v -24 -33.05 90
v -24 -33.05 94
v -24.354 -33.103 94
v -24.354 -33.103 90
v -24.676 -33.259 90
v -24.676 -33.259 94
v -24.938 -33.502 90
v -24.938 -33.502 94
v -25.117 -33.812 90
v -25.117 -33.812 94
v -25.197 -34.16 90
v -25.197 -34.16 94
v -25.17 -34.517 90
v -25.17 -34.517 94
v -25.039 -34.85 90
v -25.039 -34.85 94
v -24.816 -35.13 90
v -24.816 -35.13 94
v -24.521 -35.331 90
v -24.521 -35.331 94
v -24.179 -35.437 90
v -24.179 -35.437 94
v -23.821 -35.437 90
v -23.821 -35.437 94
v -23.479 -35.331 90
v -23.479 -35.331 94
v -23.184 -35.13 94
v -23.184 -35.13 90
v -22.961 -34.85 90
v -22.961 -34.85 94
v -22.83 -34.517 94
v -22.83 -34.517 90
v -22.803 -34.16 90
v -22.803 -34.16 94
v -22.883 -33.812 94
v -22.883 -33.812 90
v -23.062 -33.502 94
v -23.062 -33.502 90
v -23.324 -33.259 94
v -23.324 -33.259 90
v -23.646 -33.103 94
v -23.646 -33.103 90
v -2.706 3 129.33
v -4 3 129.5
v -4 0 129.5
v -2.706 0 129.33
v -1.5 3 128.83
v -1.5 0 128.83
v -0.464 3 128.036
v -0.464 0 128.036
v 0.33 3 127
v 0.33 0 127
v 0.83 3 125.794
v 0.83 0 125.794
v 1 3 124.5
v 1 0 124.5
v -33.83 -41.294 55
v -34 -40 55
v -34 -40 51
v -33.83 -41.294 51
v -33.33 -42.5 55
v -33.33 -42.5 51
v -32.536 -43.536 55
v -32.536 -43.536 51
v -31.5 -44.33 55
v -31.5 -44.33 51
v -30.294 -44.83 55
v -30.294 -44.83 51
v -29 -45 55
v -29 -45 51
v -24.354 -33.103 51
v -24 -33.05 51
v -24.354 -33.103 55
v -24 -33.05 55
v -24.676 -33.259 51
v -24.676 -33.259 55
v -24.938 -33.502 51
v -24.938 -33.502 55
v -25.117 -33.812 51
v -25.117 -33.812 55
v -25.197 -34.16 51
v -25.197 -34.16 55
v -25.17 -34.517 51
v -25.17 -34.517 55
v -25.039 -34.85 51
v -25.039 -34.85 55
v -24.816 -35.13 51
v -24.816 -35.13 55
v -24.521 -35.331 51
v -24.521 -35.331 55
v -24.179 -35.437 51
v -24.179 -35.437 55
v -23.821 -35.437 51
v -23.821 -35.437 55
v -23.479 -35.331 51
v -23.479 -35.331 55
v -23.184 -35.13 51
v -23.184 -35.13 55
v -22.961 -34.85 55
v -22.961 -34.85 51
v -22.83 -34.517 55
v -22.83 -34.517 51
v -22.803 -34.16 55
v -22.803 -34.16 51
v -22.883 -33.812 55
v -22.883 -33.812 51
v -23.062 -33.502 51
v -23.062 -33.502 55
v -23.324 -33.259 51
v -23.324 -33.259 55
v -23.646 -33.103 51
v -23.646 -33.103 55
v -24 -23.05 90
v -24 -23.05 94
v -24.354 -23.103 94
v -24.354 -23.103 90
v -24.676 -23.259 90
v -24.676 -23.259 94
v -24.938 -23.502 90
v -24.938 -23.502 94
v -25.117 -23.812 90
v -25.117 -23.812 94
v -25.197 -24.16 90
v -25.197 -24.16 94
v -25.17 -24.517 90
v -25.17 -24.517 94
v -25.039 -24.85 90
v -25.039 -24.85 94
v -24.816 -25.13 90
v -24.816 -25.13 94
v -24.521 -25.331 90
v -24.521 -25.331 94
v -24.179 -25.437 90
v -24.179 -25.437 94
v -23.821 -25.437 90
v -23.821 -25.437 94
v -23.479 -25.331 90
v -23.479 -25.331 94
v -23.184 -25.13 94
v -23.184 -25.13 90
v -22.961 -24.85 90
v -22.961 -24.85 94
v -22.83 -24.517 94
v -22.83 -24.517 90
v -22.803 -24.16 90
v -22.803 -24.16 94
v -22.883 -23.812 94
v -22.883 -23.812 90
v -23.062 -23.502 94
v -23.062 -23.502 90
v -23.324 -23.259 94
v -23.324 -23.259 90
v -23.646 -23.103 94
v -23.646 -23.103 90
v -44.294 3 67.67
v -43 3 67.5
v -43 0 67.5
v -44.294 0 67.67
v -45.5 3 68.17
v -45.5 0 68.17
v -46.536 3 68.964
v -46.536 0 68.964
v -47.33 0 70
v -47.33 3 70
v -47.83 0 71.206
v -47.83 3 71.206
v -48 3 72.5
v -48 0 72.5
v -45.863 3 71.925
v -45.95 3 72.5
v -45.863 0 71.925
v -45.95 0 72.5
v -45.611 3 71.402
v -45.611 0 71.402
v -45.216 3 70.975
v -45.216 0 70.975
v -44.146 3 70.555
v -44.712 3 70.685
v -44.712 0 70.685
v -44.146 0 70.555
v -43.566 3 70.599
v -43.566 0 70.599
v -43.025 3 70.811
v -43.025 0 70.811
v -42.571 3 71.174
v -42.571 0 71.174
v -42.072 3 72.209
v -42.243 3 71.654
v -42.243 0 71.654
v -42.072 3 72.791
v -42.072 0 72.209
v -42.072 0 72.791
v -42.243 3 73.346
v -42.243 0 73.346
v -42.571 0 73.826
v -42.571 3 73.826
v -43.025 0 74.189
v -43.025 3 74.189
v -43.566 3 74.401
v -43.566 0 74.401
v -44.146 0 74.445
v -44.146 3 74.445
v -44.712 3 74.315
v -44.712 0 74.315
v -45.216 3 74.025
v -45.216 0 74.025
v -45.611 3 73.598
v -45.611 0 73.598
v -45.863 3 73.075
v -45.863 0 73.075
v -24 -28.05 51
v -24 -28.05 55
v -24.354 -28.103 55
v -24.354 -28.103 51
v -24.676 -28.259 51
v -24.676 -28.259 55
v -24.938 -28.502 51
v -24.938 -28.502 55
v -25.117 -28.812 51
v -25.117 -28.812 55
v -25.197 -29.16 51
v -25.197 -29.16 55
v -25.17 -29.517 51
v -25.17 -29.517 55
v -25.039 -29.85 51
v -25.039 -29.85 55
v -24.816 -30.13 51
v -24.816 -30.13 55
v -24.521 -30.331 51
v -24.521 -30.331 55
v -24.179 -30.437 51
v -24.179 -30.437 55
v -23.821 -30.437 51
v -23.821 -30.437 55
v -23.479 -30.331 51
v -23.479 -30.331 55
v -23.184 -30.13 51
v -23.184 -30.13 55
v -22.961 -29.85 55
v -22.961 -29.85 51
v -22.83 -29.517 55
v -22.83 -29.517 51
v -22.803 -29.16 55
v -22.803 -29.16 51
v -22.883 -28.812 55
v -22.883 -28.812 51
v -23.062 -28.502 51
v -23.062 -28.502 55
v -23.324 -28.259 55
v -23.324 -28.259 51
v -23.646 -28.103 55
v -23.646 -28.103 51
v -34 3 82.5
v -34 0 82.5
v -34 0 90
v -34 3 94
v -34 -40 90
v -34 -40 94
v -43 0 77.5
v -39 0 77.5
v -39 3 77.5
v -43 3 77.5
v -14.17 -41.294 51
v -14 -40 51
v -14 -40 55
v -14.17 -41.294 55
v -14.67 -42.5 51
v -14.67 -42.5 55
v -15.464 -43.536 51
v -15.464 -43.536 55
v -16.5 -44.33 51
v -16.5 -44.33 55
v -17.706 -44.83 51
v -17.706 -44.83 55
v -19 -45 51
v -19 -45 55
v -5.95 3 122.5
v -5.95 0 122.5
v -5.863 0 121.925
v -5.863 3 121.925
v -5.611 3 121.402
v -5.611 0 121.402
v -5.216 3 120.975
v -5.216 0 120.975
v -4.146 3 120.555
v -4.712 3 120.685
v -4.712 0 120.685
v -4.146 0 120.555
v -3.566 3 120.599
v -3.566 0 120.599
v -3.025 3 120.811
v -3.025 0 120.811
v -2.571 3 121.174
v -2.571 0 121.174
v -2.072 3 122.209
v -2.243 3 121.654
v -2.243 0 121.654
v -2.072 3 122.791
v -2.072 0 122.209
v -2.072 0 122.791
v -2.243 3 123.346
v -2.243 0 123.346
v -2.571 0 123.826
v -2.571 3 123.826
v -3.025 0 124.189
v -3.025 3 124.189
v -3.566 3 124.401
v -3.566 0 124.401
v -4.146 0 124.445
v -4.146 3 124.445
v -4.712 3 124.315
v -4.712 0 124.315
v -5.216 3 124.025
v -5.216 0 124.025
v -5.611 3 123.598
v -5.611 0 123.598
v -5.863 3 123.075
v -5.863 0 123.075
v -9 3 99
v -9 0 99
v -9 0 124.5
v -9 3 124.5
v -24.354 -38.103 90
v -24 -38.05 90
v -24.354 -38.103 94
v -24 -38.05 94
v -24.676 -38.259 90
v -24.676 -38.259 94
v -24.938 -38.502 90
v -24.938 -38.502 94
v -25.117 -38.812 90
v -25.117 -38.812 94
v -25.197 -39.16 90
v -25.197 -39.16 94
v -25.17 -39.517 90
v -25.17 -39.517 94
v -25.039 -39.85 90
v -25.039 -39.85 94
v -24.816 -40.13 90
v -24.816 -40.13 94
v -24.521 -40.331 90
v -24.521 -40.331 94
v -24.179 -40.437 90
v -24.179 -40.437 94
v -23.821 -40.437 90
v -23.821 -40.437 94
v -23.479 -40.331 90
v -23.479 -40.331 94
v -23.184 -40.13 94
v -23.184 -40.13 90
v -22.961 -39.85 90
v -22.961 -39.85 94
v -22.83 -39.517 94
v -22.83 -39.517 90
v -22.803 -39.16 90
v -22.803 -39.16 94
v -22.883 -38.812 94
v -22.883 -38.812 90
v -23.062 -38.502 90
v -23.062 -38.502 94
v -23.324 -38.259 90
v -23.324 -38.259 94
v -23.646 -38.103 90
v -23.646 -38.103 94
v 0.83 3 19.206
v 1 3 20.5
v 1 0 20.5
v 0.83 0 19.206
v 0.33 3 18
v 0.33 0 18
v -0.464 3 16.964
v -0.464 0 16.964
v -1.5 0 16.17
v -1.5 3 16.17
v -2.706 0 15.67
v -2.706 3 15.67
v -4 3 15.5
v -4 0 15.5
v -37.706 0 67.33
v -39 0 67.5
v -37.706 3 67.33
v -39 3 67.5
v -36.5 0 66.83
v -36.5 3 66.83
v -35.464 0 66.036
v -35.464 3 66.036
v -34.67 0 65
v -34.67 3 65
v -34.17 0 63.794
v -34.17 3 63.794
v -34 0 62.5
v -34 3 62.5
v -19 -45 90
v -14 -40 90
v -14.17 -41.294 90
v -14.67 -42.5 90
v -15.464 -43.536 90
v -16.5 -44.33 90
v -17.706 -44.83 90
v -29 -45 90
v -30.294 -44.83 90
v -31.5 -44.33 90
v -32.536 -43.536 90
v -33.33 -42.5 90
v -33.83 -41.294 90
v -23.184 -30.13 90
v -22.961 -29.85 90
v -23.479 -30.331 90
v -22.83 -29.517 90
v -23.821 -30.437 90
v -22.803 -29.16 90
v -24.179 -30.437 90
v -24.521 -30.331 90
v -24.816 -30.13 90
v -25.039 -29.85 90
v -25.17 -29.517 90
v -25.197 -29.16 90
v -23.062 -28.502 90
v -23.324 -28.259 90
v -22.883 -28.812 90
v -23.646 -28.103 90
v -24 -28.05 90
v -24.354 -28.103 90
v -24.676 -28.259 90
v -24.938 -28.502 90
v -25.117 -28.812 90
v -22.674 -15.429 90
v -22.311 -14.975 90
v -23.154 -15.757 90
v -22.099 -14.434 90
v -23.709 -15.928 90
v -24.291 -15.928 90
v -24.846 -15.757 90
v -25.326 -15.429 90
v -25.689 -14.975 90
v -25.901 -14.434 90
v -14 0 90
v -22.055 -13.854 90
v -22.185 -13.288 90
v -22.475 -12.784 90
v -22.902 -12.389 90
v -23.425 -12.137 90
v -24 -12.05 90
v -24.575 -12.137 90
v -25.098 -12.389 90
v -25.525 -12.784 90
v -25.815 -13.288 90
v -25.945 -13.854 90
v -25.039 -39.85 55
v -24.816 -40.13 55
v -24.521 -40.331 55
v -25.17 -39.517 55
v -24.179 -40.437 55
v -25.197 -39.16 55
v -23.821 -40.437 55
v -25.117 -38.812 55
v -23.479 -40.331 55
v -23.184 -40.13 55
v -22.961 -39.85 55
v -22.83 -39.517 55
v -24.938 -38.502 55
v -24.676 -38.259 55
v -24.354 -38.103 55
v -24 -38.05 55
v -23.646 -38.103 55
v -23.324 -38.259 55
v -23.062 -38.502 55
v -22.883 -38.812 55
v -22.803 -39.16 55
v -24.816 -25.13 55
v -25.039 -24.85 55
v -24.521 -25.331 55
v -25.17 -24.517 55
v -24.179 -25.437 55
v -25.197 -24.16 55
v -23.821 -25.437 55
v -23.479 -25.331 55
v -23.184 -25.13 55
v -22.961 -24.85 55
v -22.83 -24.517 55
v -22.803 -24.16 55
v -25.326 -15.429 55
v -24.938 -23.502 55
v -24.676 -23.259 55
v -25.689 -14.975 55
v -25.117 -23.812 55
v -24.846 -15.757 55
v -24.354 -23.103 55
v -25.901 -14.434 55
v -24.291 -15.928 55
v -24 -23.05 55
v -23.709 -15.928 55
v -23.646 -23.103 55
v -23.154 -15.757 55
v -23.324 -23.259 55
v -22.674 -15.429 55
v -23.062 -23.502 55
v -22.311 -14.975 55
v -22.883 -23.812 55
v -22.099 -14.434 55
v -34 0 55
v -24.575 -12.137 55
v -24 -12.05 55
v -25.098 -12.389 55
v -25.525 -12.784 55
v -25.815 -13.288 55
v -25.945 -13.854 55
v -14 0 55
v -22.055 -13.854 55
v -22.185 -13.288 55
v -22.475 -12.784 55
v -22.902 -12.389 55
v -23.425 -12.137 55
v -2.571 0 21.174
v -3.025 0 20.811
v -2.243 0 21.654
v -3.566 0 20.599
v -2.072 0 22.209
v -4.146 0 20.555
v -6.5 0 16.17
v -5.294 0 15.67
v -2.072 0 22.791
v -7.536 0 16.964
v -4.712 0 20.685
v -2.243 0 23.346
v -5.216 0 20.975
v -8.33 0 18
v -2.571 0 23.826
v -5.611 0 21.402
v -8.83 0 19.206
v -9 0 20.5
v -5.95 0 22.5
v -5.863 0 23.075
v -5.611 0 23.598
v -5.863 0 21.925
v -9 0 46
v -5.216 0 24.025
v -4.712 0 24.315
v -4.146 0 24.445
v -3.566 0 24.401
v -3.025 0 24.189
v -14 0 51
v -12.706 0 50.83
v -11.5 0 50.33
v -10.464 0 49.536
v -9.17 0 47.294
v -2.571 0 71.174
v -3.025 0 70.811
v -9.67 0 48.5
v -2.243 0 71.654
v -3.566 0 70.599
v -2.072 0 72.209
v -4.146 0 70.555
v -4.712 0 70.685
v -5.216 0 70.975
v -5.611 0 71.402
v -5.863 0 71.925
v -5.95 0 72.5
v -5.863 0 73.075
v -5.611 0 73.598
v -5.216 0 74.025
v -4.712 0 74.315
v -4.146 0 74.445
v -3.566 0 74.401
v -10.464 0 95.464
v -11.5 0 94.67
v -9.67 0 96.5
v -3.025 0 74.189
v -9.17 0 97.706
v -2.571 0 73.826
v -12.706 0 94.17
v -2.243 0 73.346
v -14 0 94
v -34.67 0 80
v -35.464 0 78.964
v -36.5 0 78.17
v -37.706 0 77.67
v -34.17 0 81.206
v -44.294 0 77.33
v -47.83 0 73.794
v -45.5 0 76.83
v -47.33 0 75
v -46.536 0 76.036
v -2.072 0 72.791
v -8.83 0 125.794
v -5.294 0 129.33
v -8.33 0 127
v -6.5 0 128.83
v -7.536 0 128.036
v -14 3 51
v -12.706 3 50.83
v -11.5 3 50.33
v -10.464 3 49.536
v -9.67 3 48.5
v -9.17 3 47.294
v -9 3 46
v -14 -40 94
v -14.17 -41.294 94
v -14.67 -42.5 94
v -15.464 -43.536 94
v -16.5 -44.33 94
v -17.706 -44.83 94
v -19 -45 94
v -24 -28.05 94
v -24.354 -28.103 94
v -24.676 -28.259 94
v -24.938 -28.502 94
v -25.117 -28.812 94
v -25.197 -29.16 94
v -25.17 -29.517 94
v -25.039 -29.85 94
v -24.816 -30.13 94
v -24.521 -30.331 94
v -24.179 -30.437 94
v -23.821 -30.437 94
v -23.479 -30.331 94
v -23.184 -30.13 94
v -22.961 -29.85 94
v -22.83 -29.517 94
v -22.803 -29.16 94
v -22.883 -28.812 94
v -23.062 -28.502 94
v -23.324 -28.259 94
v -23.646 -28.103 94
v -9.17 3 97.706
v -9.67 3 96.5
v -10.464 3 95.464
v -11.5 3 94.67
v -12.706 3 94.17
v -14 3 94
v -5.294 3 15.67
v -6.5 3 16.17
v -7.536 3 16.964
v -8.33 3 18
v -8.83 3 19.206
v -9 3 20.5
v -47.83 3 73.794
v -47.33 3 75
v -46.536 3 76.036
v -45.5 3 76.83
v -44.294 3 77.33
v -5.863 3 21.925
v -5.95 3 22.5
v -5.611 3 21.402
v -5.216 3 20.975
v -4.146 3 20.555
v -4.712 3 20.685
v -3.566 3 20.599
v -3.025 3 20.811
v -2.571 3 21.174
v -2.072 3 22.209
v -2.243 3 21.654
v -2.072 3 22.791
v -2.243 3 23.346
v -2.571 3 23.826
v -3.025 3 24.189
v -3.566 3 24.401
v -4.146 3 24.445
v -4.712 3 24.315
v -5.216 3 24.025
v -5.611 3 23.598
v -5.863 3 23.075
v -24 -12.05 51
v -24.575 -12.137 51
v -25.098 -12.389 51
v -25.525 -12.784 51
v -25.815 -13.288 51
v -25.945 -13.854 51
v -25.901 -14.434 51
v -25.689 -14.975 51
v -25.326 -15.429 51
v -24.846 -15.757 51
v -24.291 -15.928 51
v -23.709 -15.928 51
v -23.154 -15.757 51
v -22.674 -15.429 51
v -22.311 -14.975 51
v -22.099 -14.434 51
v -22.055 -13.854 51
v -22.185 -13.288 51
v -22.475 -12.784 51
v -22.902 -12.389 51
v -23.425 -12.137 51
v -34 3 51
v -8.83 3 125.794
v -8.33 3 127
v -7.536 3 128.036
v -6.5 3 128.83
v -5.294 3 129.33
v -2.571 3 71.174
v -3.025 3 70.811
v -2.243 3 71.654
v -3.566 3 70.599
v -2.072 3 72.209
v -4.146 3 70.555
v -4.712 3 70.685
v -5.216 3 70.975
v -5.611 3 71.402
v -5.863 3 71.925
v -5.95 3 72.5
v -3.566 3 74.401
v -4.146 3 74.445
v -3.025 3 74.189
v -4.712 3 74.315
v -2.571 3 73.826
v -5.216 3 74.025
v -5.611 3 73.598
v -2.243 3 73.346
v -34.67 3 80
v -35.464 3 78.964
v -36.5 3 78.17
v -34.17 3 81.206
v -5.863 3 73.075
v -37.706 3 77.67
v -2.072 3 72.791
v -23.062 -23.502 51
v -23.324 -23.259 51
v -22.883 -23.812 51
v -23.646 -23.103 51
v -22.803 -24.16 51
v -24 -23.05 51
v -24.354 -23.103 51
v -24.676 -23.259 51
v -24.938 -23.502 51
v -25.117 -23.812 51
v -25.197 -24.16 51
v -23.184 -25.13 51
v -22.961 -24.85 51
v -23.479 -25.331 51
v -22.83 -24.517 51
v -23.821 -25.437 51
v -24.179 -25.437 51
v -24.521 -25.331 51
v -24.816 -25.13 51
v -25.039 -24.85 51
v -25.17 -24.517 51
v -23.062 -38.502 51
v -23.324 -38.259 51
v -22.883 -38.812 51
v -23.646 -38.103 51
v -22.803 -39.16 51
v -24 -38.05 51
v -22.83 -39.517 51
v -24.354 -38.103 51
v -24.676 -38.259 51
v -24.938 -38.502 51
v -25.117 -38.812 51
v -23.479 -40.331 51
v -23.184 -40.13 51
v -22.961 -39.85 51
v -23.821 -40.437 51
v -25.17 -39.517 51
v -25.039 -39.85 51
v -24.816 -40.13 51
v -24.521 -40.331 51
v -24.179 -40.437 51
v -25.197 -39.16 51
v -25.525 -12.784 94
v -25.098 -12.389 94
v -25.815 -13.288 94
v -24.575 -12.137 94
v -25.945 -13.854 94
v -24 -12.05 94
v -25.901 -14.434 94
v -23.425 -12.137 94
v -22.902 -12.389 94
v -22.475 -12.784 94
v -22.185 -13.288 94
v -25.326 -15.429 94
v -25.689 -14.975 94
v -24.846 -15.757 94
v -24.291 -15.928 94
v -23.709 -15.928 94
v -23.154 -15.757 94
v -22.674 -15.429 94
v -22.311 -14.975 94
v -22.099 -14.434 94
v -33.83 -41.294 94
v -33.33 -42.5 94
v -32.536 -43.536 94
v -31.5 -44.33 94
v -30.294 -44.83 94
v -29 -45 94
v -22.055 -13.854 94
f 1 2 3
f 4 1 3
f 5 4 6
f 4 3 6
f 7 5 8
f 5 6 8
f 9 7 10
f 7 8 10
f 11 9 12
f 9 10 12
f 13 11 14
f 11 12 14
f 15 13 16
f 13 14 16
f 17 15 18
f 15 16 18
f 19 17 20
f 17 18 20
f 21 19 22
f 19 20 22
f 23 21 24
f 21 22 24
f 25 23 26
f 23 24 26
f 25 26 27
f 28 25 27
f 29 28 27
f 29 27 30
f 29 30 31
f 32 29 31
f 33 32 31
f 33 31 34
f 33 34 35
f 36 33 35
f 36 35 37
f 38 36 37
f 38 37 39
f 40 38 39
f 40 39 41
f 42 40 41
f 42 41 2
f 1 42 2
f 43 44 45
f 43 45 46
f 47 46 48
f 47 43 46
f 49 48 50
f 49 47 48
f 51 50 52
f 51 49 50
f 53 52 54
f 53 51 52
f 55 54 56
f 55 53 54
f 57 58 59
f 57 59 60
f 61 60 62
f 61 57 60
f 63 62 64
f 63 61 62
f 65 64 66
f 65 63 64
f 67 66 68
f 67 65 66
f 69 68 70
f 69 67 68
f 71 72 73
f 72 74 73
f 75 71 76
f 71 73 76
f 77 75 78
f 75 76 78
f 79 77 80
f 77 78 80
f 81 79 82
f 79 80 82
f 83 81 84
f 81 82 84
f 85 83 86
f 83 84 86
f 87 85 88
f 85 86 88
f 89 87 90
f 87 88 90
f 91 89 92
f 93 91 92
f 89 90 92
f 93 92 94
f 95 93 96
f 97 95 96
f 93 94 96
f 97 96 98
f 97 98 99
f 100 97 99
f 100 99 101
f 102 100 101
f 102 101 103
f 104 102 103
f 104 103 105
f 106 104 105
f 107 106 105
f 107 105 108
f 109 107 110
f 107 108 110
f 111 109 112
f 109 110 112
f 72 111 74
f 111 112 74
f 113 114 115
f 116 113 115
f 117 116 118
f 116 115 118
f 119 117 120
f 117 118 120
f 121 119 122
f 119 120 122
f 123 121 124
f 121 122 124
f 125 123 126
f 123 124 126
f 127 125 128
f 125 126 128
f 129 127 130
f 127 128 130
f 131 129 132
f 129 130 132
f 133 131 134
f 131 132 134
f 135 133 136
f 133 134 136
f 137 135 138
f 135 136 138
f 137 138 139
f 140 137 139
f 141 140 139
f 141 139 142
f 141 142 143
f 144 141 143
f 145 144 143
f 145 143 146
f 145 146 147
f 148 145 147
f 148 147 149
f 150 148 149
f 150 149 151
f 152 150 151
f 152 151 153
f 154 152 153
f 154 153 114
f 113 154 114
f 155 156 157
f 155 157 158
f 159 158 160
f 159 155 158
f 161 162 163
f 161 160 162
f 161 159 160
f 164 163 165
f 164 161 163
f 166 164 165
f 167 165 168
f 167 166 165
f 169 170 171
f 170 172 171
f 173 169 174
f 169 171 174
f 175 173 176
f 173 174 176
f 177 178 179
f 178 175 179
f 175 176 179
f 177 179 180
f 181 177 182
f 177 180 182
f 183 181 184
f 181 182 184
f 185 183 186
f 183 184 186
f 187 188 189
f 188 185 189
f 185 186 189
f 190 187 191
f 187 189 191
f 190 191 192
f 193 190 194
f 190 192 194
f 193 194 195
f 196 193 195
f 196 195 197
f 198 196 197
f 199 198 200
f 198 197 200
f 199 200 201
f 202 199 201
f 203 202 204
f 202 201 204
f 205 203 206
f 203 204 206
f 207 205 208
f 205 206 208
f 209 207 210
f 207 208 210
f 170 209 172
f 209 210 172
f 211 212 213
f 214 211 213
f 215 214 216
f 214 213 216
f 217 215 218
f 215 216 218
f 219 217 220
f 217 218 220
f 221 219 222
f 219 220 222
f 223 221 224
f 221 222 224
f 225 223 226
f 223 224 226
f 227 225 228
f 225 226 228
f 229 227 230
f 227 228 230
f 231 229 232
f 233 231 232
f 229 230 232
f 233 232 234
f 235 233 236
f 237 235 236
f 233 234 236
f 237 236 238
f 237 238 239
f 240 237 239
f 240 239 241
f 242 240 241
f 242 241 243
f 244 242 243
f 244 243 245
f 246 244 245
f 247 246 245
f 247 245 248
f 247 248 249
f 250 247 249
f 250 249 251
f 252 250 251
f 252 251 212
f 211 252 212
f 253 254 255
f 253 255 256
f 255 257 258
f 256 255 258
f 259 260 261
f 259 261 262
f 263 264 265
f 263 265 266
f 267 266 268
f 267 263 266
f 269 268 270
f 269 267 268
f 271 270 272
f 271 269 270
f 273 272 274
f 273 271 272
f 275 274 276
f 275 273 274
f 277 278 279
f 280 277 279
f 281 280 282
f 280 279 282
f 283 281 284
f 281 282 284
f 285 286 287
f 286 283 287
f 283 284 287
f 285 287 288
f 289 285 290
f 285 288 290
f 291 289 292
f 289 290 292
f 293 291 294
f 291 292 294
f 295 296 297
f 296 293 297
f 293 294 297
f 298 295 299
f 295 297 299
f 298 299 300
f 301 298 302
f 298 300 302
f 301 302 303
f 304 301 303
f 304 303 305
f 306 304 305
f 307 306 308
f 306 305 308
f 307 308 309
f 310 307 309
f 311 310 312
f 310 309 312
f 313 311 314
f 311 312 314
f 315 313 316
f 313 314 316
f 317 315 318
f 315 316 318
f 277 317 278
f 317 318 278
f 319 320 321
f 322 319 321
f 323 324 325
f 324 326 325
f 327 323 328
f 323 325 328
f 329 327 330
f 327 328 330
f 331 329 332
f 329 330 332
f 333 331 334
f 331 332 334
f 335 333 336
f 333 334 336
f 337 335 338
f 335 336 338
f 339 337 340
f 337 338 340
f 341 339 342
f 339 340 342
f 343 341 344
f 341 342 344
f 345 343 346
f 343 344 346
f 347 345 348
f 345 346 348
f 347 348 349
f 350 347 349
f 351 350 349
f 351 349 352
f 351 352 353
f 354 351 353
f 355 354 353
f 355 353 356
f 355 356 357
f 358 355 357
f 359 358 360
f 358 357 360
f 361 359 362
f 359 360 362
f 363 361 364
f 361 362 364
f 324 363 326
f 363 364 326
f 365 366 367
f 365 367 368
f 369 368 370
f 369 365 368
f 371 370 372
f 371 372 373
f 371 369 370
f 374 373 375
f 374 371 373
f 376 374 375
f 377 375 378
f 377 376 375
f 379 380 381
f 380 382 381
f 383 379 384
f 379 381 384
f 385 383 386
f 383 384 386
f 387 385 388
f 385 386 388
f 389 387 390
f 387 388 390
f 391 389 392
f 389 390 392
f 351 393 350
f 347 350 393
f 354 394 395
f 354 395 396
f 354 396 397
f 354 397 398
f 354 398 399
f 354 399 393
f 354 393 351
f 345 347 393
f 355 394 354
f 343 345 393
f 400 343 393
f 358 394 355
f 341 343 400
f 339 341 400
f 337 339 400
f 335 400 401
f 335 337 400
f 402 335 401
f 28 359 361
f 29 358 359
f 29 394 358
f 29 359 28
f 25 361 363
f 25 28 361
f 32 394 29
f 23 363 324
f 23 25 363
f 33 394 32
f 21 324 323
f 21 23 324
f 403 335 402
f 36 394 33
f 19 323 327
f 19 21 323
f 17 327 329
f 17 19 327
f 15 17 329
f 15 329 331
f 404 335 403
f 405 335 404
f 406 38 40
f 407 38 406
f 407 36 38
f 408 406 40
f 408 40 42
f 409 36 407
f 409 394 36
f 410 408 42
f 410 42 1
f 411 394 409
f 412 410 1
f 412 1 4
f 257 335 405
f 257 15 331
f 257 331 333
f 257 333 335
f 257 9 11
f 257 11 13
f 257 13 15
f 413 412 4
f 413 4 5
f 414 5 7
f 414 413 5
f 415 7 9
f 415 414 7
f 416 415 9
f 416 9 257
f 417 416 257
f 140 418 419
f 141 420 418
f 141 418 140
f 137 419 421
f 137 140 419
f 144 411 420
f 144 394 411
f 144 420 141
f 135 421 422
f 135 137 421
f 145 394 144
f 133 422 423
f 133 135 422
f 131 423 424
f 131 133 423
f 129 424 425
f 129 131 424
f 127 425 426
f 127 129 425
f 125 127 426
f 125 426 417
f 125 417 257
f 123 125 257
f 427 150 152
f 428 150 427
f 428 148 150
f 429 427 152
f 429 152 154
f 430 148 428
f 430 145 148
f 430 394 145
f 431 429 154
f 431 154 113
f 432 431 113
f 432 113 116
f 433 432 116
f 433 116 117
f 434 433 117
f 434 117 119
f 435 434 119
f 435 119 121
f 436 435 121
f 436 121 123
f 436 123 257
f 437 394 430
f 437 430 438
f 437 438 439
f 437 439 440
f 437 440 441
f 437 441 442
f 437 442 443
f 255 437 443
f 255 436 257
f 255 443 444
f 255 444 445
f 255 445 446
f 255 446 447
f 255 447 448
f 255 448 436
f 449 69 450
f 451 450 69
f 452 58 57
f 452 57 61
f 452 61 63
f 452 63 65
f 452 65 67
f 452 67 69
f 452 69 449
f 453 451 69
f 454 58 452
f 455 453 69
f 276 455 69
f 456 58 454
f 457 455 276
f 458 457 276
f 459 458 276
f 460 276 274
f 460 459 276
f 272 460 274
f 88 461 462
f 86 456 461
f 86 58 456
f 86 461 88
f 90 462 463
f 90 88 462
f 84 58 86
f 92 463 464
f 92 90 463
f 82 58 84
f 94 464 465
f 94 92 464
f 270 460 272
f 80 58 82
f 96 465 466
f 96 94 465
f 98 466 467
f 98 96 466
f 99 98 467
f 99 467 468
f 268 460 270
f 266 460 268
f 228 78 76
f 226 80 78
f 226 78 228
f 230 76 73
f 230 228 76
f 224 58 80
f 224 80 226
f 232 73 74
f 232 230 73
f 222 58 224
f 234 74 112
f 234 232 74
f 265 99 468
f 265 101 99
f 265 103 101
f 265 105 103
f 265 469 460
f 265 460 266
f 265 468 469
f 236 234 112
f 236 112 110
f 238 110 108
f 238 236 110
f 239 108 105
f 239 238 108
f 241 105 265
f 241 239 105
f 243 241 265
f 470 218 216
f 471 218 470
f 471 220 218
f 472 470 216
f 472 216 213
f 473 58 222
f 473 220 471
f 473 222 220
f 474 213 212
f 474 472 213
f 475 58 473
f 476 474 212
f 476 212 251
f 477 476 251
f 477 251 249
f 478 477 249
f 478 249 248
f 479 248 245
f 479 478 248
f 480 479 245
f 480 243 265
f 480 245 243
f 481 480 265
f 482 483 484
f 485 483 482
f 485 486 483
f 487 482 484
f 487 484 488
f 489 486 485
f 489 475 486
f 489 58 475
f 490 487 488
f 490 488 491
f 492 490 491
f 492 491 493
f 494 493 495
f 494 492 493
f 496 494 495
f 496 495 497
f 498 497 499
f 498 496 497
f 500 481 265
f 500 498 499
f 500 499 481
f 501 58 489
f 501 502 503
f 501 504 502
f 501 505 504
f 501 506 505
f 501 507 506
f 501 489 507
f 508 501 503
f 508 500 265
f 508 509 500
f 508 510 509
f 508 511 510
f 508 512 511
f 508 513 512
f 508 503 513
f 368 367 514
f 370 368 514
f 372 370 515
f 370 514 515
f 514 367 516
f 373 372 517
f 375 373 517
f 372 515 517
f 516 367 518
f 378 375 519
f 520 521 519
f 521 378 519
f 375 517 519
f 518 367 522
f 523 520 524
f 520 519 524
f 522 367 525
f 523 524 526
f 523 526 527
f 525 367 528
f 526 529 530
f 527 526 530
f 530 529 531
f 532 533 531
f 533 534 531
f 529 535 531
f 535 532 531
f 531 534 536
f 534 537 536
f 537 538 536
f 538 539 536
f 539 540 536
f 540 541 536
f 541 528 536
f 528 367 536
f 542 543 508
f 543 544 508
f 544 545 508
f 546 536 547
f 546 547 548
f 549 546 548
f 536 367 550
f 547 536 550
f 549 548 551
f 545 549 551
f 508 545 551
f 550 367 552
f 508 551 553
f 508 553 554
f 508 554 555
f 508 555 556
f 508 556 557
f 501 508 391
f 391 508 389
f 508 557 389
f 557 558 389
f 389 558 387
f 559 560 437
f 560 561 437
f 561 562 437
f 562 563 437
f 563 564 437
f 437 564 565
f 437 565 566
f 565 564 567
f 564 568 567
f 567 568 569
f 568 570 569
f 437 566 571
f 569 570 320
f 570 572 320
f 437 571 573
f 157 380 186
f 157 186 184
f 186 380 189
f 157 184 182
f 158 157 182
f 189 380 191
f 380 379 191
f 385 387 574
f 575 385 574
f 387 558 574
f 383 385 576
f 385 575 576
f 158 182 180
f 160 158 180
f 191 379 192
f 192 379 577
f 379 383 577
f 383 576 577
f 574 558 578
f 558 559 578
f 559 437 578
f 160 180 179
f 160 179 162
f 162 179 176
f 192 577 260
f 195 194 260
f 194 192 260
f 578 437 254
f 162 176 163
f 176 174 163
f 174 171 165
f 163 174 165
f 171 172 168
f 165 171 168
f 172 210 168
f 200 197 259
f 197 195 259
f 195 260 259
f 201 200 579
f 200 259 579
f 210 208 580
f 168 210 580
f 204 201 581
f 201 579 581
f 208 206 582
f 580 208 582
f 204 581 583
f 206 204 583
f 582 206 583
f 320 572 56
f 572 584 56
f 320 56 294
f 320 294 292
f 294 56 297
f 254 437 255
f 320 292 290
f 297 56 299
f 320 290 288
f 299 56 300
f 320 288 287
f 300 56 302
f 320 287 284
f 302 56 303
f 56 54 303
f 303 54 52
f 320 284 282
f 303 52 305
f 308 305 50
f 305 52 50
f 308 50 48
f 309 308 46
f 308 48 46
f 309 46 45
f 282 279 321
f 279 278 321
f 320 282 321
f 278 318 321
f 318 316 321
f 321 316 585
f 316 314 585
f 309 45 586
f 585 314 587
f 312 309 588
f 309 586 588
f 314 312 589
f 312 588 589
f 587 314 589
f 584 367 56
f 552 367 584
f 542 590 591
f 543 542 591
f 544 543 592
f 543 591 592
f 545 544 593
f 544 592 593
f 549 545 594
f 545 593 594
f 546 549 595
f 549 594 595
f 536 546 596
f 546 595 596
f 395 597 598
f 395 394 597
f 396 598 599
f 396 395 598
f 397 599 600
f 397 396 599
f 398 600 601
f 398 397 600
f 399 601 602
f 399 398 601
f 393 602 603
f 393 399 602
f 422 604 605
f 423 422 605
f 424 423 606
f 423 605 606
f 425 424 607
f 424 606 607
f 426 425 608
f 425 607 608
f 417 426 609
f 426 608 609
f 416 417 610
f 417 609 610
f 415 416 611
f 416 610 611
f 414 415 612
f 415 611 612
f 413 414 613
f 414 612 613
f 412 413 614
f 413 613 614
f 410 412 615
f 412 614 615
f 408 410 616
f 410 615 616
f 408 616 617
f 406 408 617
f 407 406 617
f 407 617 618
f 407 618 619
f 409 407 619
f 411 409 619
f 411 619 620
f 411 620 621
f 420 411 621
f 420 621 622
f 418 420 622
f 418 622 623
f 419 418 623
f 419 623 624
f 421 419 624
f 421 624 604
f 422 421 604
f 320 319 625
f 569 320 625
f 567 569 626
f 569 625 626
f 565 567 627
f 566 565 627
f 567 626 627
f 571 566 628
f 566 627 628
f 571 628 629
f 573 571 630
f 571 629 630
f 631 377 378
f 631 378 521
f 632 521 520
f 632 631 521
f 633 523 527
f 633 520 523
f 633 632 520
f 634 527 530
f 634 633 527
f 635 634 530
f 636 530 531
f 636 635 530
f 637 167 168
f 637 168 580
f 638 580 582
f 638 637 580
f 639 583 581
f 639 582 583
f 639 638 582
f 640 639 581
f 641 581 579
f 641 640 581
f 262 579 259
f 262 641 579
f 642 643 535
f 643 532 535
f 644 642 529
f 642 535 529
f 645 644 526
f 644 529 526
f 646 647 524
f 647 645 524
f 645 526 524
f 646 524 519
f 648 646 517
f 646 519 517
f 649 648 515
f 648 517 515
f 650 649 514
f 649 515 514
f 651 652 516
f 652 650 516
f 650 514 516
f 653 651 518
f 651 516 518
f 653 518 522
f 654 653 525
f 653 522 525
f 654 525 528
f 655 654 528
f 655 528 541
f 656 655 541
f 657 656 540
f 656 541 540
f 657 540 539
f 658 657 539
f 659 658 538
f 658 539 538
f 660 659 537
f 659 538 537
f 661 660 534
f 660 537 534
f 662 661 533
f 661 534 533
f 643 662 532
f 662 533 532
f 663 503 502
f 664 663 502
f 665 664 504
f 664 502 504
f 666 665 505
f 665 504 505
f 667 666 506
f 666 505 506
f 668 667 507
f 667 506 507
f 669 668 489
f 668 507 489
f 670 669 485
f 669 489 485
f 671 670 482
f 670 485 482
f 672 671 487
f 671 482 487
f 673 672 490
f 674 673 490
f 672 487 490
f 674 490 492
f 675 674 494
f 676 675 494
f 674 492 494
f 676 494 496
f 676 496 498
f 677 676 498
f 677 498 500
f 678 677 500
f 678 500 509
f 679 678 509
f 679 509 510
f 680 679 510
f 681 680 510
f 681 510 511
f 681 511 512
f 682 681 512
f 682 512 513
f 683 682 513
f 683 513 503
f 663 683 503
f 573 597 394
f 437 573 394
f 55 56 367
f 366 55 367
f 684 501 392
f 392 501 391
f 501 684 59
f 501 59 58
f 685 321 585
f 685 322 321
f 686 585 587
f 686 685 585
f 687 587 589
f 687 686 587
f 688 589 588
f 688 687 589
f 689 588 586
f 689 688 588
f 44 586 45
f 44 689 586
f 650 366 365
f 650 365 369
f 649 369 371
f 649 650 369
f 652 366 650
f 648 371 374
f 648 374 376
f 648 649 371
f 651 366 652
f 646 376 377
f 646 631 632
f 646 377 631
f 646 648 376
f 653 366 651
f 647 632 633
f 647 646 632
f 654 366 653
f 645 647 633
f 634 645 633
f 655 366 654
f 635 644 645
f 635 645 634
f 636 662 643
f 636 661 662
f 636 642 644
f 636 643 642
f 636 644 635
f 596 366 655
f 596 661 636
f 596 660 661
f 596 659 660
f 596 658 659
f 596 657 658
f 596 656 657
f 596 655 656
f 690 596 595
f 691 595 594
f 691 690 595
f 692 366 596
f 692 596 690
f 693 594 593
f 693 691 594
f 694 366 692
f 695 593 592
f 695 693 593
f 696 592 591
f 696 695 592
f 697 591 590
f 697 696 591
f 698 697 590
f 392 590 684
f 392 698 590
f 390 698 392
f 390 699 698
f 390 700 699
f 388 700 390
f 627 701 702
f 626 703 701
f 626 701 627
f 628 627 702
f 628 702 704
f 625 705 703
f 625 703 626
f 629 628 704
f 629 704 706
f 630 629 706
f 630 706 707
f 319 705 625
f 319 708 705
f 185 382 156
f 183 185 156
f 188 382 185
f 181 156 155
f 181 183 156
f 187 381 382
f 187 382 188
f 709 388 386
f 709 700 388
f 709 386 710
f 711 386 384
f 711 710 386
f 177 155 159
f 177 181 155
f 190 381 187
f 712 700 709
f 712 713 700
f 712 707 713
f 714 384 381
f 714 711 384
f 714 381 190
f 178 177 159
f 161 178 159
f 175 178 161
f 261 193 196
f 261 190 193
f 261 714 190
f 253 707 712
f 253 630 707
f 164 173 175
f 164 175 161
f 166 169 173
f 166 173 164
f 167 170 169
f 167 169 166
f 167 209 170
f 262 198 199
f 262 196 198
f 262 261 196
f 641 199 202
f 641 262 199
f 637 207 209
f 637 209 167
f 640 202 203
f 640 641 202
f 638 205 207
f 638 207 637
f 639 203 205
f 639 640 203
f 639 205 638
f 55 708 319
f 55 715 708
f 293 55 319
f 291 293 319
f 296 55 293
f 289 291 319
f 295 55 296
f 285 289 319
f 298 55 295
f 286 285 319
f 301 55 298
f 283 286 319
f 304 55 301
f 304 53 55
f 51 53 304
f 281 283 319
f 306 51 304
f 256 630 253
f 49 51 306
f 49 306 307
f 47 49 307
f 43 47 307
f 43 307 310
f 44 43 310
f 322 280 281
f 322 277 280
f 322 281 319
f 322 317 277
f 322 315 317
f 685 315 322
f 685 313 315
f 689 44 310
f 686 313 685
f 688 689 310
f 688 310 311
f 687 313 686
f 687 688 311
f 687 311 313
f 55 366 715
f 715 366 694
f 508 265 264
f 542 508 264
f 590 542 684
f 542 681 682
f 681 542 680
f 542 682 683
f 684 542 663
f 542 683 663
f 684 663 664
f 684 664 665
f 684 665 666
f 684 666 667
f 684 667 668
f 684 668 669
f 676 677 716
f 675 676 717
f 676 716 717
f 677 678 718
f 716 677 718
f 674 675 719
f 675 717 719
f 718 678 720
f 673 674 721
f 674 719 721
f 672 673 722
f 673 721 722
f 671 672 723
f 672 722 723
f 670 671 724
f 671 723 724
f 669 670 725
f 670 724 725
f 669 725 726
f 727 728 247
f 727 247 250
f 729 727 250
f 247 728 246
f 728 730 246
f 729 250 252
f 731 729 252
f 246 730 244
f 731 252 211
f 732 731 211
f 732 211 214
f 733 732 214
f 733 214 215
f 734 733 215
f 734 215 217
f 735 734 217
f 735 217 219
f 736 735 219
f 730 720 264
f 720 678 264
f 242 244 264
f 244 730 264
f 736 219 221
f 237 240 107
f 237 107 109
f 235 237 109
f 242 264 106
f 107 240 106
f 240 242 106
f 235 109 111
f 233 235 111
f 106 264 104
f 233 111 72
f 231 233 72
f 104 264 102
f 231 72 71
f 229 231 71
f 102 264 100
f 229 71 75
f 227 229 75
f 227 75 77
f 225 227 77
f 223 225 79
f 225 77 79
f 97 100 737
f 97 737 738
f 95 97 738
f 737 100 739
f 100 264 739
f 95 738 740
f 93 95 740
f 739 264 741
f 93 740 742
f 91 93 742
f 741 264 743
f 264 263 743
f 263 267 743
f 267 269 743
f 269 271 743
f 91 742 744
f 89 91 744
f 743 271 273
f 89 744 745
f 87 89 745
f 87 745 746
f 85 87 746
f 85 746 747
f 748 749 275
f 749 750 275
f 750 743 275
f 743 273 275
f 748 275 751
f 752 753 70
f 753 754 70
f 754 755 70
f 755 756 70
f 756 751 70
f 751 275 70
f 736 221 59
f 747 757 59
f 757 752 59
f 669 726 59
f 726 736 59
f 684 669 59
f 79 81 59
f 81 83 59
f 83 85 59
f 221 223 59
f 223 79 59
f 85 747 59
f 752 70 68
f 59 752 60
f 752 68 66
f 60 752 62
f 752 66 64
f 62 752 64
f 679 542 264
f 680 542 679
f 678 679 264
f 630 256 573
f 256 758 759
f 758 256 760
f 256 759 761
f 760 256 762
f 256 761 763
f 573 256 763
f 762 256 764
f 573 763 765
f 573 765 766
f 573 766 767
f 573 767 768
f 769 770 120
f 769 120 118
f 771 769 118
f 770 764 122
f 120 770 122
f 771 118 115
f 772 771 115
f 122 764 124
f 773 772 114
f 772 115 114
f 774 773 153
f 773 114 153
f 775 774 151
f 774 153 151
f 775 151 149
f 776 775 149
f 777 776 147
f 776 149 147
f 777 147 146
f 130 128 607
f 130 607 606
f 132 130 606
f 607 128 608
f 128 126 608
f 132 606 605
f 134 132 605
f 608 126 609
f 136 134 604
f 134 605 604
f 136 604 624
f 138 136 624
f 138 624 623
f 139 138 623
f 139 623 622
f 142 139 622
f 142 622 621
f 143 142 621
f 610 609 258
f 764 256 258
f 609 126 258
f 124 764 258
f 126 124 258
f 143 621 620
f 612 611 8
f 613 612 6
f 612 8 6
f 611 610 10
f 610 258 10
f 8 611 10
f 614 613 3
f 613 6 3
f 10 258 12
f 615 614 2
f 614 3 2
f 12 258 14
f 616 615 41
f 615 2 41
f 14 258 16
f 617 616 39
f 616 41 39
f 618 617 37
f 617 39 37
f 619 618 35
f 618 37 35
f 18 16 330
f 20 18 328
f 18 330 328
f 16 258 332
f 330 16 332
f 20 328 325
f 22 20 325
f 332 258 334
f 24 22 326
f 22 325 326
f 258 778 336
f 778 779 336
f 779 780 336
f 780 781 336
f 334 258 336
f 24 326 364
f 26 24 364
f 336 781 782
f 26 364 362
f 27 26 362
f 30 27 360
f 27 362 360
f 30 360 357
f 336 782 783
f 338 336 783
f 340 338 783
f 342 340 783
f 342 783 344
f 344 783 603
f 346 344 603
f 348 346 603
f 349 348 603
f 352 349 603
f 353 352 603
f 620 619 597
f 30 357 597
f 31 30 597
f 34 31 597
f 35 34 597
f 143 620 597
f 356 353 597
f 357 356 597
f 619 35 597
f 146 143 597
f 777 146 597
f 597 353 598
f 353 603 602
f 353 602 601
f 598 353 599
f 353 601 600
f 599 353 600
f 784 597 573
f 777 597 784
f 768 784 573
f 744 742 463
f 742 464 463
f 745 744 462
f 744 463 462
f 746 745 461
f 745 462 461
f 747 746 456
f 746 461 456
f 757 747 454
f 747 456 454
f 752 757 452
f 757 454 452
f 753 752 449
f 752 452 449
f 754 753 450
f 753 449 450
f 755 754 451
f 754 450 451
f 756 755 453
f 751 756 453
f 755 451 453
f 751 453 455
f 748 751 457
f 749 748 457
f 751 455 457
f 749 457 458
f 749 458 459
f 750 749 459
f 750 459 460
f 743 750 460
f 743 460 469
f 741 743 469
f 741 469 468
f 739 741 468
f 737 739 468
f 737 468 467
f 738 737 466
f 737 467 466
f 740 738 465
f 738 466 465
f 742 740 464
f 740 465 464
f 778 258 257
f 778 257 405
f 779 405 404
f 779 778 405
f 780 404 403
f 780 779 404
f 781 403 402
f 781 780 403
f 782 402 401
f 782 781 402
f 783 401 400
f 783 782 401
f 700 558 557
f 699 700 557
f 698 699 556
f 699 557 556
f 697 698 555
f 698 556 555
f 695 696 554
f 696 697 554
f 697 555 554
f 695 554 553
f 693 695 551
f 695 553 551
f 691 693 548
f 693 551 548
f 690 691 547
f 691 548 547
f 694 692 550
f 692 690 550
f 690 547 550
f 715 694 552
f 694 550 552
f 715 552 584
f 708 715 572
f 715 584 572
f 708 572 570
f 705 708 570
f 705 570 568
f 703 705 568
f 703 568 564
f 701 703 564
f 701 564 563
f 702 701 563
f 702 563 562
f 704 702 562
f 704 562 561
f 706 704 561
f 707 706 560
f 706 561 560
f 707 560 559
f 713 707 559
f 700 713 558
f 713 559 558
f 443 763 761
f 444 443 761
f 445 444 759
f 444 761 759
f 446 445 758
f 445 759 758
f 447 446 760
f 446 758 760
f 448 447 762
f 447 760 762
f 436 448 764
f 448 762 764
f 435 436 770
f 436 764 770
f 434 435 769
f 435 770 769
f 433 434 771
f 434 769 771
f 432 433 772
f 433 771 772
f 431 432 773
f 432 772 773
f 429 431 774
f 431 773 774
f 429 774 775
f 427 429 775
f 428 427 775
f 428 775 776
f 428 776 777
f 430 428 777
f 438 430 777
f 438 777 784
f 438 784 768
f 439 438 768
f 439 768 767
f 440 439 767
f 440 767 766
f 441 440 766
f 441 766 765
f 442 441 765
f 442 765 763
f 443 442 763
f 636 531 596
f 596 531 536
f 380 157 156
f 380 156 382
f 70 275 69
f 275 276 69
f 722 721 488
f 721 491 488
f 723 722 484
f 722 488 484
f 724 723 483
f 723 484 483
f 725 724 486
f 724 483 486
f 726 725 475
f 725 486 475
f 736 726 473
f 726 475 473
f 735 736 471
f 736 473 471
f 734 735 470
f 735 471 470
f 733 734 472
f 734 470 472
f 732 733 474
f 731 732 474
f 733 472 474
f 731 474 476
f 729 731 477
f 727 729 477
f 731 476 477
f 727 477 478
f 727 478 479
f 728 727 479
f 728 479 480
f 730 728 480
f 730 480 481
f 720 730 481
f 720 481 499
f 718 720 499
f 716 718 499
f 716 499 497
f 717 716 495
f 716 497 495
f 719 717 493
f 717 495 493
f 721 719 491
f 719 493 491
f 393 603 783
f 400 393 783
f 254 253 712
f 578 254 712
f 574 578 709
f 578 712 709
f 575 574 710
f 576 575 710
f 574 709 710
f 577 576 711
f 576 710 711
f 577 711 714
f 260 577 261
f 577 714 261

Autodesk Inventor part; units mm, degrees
ref_plane "YZ Plane" through (0, 0, 0) normal (1, 0, 0) x (0, 1, 0)
ref_plane "XZ Plane" through (0, 0, 0) normal (0, 1, 0) x (-1, 0, 0)
ref_plane "XY Plane" through (0, 0, 0) normal (0, 0, 1) x (1, 0, 0)
sketch "Szkic1" plane through (0, 0, 0) normal (0, 1, 0) x (-1, 0, 0)
  line L0 (9, 129.5) -> (-1, 129.5)
  line L1 (-1, 129.5) -> (-1, 15.5)
  line L2 (-1, 15.5) -> (9, 15.5)
  line L3 (9, 15.5) -> (9, 129.5)
  circle A0 centre (4, 22.5) radius 1.95
  circle A1 centre (4, 122.5) radius 1.95
  line L4 (48, 148) -> (48, 0)
  line L5 (9, 77.5) -> (48, 77.5)
  line L6 (48, 77.5) -> (48, 67.5)
  line L7 (48, 67.5) -> (9, 67.5)
  line L8 (9, 67.5) -> (9, 77.5)
  circle A2 centre (44, 72.5) radius 1.95
  line L9 (34, 94) -> (9, 94)
  line L10 (9, 94) -> (9, 51)
  line L11 (9, 51) -> (34, 51)
  line L12 (34, 51) -> (34, 94)
  circle A3 centre (4, 72.5) radius 1.95
  line L13 (34, 90) -> (9, 90) construction
  line L14 (9, 90) -> (9, 55) construction
  line L15 (9, 55) -> (34, 55) construction
  line L16 (34, 55) -> (34, 90) construction
  line L17 (34, 94) -> (14, 94)
  line L18 (14, 94) -> (14, 90)
  line L19 (14, 90) -> (34, 90)
  line L20 (34, 90) -> (34, 94)
  line L21 (14, 51) -> (34, 51)
  line L22 (34, 51) -> (34, 55)
  line L23 (34, 55) -> (14, 55)
  line L24 (14, 55) -> (14, 51)
  circle A4 centre (24, 47.5) radius 1.95
  circle A5 centre (24, 97.5) radius 1.95
  point P0 (0, 0)
  point P1 (12.3183, 7)
  dimension "d0" = 7
  dimension "d1" = 7
  dimension "d2" = 5
  dimension "d3" = 5
  dimension "d4" = 5
  dimension "d5" = 5
  dimension "d6" = 43
  dimension "d7" = 16.5
  dimension "d8" = 25
  dimension "d9" = 35
  dimension "d10" = 12.5
  dimension "d11" = 10
extrude "Wyciągnięcie proste1" add sketch "Szkic1" along normal blind 3 contours L3 L2 L1 L0 | L9 L18 L19 L12 L5 L3 | L5 L12 L7 L3 | L9 L12 L19 L18 | L7 L12 L23 L24 L11 L3 | L5 L4 L7 L12 | L24 L23 L12 L11
extrude "Wyciągnięcie proste2" add sketch "Szkic1" against normal blind 45 contours L9 L12 L19 L18 | L24 L23 L12 L11
fillet "Zaokrąglenie1" radius 5 14 edges at (-34, 1.5, 67.5) (-34, 1.5, 77.5) (-48, 1.5, 77.5) (-48, 1.5, 67.5) (-9, 1.5, 51) (-9, 1.5, 15.5) (1, 1.5, 15.5) (-9, 1.5, 94) (-9, 1.5, 129.5) (1, 1.5, 129.5) (-34, -45, 92) (-34, -45, 53) (-14, -45, 53) (-14, -45, 92)
sketch "Szkic2" plane through (-14, 3, 51) normal (0, 0, -1) x (-1, 0, 0)
  arc A0 (0, -43) -> (5, -48) centre (5, -43) ccw projected
  line L0 (15, -48) -> (5, -48) projected
  arc A1 (15, -48) -> (20, -43) centre (15, -43) ccw projected
  line L1 (20, -43) -> (20, 0) projected
  line L2 (0, 0) -> (20, 0) projected
  line L3 (0, -3) -> (0, 0) projected
  line L4 (0, -3) -> (0, -43) projected
  line L5 (-5, -3) -> (20, -3) projected
  point P0 (-14, -3)
  point P1 (10, -17)
  point P2 (10, -27.25)
  point P3 (10, -32.25)
  point P4 (10, -37.25)
  point P5 (10, -42.25)
  dimension "d17" = 14
  dimension "d18" = 10
  dimension "d19" = 10.25
  dimension "d20" = 5
  dimension "d21" = 5
  dimension "d22" = 5
hole "Otwór1" at (-24, -24.25, 51) at (-24, -29.25, 51) at (-24, -34.25, 51) at (-24, -39.25, 51) direction (0, 0, 1) diameter 2.4 end through all clearance for "Śruba ze łbem płaskim obrobiona" size "M2" standard "ANSI Profil metryczny M"
hole "Otwór2" at (-24, -14, 51) direction (0, 0, 1) diameter 3.9 end through all clearance for "Śruba ze łbem płaskim obrobiona" size "M3.5" standard "ANSI Profil metryczny M"
equation "\"d3\" = d2"
equation "\"d5\" = d4"
properties part number "czesc_do_obudowy"
